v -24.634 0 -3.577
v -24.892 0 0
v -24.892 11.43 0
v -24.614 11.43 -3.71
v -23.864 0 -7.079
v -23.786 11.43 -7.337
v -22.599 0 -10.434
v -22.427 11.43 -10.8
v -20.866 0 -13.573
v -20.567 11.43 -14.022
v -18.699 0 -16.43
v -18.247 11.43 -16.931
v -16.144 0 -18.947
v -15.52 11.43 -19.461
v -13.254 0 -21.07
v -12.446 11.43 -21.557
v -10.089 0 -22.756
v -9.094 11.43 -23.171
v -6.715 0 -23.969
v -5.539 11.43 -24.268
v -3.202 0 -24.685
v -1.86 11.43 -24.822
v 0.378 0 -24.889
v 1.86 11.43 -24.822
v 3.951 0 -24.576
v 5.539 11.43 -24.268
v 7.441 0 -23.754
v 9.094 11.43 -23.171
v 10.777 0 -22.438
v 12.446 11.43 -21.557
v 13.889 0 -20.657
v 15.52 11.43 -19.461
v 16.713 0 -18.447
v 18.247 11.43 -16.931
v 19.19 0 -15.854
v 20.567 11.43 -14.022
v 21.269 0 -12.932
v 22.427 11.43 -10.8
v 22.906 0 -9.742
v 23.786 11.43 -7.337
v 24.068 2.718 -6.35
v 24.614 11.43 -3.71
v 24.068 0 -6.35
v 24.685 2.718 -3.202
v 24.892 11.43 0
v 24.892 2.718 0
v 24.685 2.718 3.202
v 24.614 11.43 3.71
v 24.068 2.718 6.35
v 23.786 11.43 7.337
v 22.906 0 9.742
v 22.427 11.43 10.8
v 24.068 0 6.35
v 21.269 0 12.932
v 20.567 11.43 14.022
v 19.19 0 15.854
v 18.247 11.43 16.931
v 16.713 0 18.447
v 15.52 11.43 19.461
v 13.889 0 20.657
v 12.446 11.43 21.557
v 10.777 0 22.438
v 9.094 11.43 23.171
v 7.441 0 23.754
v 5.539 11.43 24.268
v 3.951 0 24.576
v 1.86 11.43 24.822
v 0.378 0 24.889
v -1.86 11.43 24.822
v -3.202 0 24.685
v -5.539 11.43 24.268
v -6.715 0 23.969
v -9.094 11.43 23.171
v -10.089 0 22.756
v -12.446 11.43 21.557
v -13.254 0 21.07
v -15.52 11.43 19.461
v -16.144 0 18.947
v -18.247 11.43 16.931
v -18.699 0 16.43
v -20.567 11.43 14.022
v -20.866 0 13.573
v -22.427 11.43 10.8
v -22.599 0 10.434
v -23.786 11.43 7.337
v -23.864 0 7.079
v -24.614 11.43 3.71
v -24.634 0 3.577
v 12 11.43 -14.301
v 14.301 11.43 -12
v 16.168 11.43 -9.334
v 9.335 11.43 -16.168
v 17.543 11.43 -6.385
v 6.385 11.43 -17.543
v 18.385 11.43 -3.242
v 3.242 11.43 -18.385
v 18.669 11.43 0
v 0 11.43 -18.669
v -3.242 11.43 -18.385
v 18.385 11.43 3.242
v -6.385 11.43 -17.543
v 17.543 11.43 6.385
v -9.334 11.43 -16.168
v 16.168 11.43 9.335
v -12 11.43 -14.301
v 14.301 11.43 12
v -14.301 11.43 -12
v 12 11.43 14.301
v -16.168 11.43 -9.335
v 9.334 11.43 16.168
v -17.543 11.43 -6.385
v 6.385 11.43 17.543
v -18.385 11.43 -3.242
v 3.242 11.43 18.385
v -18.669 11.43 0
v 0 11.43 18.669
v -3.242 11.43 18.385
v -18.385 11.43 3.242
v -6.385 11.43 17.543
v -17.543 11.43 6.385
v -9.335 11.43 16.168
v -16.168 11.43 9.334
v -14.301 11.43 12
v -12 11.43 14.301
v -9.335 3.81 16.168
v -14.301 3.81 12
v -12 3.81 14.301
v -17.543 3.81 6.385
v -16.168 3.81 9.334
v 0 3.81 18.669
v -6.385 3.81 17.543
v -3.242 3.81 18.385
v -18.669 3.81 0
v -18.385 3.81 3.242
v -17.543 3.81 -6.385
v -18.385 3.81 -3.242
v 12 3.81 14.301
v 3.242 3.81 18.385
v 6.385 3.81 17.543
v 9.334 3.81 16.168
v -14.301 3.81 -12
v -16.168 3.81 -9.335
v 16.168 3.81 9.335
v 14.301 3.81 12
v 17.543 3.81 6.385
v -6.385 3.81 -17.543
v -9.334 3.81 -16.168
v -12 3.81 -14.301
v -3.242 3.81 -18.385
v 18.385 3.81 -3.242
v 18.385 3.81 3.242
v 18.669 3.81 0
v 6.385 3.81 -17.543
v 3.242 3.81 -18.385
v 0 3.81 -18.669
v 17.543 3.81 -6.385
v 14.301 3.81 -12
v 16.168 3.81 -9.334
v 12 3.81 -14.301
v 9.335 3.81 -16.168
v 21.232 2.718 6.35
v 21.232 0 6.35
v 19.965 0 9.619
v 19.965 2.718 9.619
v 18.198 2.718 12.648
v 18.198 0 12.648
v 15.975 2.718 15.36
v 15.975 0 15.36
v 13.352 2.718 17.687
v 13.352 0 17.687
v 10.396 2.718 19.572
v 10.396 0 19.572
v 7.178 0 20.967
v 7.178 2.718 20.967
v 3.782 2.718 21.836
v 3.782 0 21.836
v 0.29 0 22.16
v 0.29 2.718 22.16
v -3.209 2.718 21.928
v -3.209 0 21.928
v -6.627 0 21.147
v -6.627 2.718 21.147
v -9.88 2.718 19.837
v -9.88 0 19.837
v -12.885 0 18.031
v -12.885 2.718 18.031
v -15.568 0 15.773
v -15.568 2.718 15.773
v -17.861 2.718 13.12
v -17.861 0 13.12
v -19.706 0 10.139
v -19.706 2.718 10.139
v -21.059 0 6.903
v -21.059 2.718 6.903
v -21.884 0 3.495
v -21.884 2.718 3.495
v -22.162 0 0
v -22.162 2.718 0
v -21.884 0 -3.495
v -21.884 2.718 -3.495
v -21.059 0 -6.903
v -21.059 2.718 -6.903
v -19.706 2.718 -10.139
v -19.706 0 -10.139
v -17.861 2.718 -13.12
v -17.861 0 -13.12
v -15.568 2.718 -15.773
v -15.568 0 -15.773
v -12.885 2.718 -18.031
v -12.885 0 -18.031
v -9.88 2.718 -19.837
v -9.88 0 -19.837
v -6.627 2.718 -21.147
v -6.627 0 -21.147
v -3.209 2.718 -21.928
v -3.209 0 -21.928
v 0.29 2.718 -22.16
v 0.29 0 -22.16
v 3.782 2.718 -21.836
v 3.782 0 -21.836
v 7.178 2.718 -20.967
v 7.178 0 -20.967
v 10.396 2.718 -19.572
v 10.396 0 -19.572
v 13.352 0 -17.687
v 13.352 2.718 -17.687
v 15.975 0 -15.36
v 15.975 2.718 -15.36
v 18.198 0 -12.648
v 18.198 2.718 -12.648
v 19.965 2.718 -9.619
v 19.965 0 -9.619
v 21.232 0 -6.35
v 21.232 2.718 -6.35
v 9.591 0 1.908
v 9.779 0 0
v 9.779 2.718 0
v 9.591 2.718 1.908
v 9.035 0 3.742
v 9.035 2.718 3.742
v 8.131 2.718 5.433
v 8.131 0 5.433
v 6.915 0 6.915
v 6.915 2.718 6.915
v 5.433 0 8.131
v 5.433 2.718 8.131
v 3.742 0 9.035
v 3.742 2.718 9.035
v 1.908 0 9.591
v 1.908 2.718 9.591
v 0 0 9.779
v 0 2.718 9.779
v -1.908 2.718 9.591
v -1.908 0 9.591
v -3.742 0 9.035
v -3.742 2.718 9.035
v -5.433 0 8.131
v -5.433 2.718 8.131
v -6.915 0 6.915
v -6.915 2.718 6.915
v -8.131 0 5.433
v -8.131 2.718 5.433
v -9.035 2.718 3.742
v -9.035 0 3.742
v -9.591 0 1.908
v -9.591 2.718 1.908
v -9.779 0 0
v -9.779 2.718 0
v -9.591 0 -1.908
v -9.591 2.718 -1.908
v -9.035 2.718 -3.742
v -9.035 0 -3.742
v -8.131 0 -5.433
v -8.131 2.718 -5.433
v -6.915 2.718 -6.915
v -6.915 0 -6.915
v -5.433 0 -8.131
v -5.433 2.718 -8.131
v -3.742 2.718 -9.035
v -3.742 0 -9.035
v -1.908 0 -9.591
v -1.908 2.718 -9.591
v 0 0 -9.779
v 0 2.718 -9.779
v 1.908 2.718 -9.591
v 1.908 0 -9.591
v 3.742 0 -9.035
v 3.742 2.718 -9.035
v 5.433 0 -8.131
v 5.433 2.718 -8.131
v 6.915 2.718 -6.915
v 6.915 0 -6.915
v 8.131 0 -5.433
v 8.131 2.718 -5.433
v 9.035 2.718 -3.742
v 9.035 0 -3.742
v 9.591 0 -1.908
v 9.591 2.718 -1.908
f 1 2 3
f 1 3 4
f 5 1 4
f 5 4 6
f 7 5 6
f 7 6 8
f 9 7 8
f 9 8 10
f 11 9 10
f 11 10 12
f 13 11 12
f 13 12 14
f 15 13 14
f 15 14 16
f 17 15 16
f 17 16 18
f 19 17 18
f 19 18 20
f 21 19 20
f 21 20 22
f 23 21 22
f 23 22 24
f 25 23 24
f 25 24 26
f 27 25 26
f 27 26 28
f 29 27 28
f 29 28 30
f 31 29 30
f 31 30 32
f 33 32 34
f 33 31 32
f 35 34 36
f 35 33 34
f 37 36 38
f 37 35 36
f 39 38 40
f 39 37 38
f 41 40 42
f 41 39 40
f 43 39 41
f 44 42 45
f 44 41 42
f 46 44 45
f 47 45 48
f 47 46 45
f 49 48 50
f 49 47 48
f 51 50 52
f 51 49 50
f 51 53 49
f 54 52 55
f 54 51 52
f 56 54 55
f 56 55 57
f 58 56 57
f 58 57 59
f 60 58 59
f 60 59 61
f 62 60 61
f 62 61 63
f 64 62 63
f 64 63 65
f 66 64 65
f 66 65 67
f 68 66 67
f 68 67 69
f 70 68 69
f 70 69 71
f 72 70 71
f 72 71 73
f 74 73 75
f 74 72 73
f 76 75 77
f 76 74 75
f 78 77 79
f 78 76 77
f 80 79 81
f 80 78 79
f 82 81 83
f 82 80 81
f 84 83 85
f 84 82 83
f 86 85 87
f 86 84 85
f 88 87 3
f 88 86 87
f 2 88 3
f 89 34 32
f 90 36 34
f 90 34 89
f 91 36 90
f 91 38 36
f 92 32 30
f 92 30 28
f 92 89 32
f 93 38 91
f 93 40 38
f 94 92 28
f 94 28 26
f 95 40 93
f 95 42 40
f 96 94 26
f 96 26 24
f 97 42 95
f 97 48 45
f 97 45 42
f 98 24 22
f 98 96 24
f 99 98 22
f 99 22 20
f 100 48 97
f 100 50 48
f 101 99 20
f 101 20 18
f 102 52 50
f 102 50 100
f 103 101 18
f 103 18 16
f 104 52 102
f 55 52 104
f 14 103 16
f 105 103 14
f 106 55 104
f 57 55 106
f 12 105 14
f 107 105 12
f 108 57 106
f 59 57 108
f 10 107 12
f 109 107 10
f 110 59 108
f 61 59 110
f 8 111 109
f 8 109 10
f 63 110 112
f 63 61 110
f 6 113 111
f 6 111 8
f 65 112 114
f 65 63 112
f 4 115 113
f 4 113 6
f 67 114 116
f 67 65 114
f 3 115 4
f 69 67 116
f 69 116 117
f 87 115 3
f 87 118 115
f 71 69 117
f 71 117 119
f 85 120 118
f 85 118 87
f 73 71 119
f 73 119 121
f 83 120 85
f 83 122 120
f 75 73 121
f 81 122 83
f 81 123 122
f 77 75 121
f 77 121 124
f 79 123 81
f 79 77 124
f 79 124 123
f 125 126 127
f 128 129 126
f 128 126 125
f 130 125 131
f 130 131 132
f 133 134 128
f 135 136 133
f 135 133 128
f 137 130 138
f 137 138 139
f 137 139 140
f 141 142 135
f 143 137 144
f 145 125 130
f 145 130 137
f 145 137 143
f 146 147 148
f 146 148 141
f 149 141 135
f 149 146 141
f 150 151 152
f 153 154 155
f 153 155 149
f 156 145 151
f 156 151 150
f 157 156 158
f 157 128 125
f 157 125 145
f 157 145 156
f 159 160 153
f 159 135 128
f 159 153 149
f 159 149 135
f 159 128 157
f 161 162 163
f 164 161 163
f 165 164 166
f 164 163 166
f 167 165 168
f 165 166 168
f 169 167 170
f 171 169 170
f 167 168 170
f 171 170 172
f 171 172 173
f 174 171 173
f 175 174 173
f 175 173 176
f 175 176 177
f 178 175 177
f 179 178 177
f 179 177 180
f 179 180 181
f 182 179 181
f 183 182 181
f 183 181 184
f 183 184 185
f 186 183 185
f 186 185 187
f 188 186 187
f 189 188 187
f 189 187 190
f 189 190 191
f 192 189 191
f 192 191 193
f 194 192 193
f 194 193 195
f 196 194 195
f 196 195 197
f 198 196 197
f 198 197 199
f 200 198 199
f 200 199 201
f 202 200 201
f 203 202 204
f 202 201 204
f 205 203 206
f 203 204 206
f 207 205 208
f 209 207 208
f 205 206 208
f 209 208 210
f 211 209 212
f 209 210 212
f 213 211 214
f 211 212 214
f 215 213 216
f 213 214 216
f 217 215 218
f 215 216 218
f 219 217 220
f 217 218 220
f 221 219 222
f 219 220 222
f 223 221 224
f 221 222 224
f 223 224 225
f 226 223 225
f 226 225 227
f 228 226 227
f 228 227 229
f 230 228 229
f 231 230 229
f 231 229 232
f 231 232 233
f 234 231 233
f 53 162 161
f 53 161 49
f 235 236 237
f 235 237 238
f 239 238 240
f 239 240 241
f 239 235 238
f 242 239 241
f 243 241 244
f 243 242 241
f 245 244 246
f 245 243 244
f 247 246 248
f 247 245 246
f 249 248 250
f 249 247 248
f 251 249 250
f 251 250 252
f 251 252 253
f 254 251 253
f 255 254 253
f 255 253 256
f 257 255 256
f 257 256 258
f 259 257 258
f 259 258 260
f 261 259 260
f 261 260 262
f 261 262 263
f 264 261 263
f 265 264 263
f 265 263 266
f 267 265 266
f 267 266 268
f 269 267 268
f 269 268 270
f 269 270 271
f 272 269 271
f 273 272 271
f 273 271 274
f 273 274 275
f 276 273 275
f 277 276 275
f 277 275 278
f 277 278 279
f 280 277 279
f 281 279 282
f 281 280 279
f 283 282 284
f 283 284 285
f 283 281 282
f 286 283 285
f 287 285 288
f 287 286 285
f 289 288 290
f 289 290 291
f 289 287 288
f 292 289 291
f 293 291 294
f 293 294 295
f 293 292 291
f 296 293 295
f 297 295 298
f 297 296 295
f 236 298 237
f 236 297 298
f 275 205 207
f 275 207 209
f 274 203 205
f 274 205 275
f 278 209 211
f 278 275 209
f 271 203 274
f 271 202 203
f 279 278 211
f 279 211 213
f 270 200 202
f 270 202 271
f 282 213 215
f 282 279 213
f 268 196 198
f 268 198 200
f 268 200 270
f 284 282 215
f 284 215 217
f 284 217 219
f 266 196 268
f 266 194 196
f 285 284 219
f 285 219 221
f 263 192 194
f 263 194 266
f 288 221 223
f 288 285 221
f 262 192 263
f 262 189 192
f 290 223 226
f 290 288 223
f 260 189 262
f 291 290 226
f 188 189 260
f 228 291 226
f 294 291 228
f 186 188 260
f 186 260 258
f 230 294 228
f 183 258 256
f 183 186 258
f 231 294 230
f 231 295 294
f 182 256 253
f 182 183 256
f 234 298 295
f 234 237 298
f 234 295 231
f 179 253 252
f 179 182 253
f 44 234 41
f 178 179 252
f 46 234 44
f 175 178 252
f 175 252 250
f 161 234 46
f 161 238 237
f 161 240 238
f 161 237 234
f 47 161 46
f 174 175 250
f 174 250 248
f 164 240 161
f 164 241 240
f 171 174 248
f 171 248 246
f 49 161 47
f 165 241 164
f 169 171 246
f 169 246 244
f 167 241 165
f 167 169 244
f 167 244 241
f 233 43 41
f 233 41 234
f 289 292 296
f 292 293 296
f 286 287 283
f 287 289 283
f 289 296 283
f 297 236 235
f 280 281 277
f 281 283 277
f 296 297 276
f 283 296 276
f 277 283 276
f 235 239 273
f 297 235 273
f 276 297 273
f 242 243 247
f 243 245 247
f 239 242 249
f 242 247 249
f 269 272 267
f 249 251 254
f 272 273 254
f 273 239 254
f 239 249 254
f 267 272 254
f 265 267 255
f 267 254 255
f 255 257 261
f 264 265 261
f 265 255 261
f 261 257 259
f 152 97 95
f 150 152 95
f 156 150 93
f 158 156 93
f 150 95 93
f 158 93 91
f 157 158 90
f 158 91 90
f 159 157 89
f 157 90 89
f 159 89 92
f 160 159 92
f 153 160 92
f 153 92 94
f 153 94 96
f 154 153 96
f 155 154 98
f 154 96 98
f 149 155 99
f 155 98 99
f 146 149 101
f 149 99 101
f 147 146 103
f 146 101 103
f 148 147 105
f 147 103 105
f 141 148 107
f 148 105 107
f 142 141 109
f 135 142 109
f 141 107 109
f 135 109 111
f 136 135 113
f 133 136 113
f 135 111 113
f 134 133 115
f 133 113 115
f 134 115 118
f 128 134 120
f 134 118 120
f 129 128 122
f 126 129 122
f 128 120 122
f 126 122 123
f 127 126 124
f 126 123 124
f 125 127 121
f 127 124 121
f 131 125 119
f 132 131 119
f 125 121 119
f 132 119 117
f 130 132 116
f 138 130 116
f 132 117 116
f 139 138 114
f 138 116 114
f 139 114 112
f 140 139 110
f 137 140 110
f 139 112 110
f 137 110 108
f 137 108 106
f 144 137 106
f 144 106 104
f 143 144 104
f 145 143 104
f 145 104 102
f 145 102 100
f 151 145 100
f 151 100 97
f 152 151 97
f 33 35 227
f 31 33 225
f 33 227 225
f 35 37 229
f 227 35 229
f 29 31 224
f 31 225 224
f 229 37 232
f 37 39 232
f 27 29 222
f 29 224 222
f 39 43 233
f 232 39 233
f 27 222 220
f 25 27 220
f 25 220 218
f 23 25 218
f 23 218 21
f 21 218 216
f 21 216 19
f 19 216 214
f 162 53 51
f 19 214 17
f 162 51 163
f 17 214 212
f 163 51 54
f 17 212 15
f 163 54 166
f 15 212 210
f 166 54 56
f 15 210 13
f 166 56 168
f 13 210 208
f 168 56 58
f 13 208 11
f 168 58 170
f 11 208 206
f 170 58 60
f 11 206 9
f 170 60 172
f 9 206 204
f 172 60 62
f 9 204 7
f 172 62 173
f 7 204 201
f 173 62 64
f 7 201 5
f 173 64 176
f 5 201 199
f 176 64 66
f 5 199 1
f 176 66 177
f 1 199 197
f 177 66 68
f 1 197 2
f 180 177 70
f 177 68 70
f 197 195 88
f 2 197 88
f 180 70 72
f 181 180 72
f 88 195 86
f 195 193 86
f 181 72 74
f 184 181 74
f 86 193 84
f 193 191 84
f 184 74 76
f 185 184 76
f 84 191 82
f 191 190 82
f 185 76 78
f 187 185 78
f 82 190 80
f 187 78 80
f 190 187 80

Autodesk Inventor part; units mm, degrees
ref_plane "YZ Plane" through (0, 0, 0) normal (1, 0, 0) x (0, 1, 0)
ref_plane "XZ Plane" through (0, 0, 0) normal (0, 1, 0) x (-1, 0, 0)
ref_plane "XY Plane" through (0, 0, 0) normal (0, 0, 1) x (1, 0, 0)
sketch "Sketch1" plane through (0, 0, 0) normal (0, 1, 0) x (-1, 0, 0)
  circle A0 centre (0, 0) radius 18.542 construction
  circle A1 centre (0, 0) radius 24.892
  dimension "d0" = 37.084
  dimension "d1" = 6.35
extrude "Extrusion1" add sketch "Sketch1" along normal blind 11.43
sketch "Sketch2" plane through (0, 11.43, 0) normal (0, 1, 0) x (1, 0, 0)
  circle A0 centre (0, 0) radius 18.669
  dimension "d4" = 37.338
extrude "Extrusion2" cut sketch "Sketch2" against normal blind 7.62
sketch "Sketch3" plane through (0, 0, 0) normal (0, -1, 0) x (1, 0, 0)
  circle A0 centre (0, 0) radius 22.1615
  circle A1 centre (0, 0) radius 9.779
  dimension "d7" = 44.323
  dimension "d10" = 19.558
extrude "Extrusion4" cut sketch "Sketch3" against normal blind 2.7178
sketch "Sketch4" plane through (0, 0, 0) normal (0, -1, 0) x (1, 0, 0)
  line L0 (31.242, -6.35) -> (18.542, -6.35)
  line L1 (18.542, -6.35) -> (18.542, 6.35)
  line L2 (18.542, 6.35) -> (31.242, 6.35)
  line L3 (31.242, 6.35) -> (31.242, -6.35)
  circle A0 centre (0, 0) radius 24.892 projected
  line L4 (31.242, -6.35) -> (18.542, 6.35) construction
  line L5 (18.542, -6.35) -> (31.242, 6.35) construction
  point P0 (24.892, 0)
  dimension "d13" = 12.7
  dimension "d14" = 12.7
extrude "Extrusion5" cut sketch "Sketch4" against normal up to surface (2.7178 mm away) contours L0 A0 L2 L3 | L0 L1 L2 A0 picked at (20.6587, 0)
properties part number "Lower Power"
